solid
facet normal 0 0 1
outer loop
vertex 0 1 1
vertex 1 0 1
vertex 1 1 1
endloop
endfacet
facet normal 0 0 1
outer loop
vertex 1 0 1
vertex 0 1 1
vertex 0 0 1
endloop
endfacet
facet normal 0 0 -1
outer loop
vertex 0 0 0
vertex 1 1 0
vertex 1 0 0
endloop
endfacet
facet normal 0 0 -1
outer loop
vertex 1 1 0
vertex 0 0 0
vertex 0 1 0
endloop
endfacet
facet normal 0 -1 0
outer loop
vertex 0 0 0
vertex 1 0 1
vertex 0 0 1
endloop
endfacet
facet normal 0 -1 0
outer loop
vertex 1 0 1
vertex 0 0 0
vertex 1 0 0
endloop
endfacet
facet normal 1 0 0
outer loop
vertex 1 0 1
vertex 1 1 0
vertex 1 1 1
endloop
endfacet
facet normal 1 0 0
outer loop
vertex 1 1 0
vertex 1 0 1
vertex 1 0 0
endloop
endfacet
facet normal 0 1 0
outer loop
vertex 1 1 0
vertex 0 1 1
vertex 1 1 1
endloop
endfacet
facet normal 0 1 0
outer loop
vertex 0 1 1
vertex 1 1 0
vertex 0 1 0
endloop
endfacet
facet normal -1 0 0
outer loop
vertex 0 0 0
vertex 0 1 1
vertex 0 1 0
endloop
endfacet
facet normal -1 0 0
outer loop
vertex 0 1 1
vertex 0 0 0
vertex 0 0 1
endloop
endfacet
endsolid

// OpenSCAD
cube([1, 1, 1]);

// BEGIN lib.scad.util: section-inspection
/* [Section inspection] */
section_axis = "None"; // [None,X,Y,Z]
section_position_mm = 0; // [-100:0.5:100]
section_depth_mm = 10; // [0.1:0.1:200]
section_direction = "Positive"; // [Positive,Negative]
// END lib.scad.util: section-inspection
